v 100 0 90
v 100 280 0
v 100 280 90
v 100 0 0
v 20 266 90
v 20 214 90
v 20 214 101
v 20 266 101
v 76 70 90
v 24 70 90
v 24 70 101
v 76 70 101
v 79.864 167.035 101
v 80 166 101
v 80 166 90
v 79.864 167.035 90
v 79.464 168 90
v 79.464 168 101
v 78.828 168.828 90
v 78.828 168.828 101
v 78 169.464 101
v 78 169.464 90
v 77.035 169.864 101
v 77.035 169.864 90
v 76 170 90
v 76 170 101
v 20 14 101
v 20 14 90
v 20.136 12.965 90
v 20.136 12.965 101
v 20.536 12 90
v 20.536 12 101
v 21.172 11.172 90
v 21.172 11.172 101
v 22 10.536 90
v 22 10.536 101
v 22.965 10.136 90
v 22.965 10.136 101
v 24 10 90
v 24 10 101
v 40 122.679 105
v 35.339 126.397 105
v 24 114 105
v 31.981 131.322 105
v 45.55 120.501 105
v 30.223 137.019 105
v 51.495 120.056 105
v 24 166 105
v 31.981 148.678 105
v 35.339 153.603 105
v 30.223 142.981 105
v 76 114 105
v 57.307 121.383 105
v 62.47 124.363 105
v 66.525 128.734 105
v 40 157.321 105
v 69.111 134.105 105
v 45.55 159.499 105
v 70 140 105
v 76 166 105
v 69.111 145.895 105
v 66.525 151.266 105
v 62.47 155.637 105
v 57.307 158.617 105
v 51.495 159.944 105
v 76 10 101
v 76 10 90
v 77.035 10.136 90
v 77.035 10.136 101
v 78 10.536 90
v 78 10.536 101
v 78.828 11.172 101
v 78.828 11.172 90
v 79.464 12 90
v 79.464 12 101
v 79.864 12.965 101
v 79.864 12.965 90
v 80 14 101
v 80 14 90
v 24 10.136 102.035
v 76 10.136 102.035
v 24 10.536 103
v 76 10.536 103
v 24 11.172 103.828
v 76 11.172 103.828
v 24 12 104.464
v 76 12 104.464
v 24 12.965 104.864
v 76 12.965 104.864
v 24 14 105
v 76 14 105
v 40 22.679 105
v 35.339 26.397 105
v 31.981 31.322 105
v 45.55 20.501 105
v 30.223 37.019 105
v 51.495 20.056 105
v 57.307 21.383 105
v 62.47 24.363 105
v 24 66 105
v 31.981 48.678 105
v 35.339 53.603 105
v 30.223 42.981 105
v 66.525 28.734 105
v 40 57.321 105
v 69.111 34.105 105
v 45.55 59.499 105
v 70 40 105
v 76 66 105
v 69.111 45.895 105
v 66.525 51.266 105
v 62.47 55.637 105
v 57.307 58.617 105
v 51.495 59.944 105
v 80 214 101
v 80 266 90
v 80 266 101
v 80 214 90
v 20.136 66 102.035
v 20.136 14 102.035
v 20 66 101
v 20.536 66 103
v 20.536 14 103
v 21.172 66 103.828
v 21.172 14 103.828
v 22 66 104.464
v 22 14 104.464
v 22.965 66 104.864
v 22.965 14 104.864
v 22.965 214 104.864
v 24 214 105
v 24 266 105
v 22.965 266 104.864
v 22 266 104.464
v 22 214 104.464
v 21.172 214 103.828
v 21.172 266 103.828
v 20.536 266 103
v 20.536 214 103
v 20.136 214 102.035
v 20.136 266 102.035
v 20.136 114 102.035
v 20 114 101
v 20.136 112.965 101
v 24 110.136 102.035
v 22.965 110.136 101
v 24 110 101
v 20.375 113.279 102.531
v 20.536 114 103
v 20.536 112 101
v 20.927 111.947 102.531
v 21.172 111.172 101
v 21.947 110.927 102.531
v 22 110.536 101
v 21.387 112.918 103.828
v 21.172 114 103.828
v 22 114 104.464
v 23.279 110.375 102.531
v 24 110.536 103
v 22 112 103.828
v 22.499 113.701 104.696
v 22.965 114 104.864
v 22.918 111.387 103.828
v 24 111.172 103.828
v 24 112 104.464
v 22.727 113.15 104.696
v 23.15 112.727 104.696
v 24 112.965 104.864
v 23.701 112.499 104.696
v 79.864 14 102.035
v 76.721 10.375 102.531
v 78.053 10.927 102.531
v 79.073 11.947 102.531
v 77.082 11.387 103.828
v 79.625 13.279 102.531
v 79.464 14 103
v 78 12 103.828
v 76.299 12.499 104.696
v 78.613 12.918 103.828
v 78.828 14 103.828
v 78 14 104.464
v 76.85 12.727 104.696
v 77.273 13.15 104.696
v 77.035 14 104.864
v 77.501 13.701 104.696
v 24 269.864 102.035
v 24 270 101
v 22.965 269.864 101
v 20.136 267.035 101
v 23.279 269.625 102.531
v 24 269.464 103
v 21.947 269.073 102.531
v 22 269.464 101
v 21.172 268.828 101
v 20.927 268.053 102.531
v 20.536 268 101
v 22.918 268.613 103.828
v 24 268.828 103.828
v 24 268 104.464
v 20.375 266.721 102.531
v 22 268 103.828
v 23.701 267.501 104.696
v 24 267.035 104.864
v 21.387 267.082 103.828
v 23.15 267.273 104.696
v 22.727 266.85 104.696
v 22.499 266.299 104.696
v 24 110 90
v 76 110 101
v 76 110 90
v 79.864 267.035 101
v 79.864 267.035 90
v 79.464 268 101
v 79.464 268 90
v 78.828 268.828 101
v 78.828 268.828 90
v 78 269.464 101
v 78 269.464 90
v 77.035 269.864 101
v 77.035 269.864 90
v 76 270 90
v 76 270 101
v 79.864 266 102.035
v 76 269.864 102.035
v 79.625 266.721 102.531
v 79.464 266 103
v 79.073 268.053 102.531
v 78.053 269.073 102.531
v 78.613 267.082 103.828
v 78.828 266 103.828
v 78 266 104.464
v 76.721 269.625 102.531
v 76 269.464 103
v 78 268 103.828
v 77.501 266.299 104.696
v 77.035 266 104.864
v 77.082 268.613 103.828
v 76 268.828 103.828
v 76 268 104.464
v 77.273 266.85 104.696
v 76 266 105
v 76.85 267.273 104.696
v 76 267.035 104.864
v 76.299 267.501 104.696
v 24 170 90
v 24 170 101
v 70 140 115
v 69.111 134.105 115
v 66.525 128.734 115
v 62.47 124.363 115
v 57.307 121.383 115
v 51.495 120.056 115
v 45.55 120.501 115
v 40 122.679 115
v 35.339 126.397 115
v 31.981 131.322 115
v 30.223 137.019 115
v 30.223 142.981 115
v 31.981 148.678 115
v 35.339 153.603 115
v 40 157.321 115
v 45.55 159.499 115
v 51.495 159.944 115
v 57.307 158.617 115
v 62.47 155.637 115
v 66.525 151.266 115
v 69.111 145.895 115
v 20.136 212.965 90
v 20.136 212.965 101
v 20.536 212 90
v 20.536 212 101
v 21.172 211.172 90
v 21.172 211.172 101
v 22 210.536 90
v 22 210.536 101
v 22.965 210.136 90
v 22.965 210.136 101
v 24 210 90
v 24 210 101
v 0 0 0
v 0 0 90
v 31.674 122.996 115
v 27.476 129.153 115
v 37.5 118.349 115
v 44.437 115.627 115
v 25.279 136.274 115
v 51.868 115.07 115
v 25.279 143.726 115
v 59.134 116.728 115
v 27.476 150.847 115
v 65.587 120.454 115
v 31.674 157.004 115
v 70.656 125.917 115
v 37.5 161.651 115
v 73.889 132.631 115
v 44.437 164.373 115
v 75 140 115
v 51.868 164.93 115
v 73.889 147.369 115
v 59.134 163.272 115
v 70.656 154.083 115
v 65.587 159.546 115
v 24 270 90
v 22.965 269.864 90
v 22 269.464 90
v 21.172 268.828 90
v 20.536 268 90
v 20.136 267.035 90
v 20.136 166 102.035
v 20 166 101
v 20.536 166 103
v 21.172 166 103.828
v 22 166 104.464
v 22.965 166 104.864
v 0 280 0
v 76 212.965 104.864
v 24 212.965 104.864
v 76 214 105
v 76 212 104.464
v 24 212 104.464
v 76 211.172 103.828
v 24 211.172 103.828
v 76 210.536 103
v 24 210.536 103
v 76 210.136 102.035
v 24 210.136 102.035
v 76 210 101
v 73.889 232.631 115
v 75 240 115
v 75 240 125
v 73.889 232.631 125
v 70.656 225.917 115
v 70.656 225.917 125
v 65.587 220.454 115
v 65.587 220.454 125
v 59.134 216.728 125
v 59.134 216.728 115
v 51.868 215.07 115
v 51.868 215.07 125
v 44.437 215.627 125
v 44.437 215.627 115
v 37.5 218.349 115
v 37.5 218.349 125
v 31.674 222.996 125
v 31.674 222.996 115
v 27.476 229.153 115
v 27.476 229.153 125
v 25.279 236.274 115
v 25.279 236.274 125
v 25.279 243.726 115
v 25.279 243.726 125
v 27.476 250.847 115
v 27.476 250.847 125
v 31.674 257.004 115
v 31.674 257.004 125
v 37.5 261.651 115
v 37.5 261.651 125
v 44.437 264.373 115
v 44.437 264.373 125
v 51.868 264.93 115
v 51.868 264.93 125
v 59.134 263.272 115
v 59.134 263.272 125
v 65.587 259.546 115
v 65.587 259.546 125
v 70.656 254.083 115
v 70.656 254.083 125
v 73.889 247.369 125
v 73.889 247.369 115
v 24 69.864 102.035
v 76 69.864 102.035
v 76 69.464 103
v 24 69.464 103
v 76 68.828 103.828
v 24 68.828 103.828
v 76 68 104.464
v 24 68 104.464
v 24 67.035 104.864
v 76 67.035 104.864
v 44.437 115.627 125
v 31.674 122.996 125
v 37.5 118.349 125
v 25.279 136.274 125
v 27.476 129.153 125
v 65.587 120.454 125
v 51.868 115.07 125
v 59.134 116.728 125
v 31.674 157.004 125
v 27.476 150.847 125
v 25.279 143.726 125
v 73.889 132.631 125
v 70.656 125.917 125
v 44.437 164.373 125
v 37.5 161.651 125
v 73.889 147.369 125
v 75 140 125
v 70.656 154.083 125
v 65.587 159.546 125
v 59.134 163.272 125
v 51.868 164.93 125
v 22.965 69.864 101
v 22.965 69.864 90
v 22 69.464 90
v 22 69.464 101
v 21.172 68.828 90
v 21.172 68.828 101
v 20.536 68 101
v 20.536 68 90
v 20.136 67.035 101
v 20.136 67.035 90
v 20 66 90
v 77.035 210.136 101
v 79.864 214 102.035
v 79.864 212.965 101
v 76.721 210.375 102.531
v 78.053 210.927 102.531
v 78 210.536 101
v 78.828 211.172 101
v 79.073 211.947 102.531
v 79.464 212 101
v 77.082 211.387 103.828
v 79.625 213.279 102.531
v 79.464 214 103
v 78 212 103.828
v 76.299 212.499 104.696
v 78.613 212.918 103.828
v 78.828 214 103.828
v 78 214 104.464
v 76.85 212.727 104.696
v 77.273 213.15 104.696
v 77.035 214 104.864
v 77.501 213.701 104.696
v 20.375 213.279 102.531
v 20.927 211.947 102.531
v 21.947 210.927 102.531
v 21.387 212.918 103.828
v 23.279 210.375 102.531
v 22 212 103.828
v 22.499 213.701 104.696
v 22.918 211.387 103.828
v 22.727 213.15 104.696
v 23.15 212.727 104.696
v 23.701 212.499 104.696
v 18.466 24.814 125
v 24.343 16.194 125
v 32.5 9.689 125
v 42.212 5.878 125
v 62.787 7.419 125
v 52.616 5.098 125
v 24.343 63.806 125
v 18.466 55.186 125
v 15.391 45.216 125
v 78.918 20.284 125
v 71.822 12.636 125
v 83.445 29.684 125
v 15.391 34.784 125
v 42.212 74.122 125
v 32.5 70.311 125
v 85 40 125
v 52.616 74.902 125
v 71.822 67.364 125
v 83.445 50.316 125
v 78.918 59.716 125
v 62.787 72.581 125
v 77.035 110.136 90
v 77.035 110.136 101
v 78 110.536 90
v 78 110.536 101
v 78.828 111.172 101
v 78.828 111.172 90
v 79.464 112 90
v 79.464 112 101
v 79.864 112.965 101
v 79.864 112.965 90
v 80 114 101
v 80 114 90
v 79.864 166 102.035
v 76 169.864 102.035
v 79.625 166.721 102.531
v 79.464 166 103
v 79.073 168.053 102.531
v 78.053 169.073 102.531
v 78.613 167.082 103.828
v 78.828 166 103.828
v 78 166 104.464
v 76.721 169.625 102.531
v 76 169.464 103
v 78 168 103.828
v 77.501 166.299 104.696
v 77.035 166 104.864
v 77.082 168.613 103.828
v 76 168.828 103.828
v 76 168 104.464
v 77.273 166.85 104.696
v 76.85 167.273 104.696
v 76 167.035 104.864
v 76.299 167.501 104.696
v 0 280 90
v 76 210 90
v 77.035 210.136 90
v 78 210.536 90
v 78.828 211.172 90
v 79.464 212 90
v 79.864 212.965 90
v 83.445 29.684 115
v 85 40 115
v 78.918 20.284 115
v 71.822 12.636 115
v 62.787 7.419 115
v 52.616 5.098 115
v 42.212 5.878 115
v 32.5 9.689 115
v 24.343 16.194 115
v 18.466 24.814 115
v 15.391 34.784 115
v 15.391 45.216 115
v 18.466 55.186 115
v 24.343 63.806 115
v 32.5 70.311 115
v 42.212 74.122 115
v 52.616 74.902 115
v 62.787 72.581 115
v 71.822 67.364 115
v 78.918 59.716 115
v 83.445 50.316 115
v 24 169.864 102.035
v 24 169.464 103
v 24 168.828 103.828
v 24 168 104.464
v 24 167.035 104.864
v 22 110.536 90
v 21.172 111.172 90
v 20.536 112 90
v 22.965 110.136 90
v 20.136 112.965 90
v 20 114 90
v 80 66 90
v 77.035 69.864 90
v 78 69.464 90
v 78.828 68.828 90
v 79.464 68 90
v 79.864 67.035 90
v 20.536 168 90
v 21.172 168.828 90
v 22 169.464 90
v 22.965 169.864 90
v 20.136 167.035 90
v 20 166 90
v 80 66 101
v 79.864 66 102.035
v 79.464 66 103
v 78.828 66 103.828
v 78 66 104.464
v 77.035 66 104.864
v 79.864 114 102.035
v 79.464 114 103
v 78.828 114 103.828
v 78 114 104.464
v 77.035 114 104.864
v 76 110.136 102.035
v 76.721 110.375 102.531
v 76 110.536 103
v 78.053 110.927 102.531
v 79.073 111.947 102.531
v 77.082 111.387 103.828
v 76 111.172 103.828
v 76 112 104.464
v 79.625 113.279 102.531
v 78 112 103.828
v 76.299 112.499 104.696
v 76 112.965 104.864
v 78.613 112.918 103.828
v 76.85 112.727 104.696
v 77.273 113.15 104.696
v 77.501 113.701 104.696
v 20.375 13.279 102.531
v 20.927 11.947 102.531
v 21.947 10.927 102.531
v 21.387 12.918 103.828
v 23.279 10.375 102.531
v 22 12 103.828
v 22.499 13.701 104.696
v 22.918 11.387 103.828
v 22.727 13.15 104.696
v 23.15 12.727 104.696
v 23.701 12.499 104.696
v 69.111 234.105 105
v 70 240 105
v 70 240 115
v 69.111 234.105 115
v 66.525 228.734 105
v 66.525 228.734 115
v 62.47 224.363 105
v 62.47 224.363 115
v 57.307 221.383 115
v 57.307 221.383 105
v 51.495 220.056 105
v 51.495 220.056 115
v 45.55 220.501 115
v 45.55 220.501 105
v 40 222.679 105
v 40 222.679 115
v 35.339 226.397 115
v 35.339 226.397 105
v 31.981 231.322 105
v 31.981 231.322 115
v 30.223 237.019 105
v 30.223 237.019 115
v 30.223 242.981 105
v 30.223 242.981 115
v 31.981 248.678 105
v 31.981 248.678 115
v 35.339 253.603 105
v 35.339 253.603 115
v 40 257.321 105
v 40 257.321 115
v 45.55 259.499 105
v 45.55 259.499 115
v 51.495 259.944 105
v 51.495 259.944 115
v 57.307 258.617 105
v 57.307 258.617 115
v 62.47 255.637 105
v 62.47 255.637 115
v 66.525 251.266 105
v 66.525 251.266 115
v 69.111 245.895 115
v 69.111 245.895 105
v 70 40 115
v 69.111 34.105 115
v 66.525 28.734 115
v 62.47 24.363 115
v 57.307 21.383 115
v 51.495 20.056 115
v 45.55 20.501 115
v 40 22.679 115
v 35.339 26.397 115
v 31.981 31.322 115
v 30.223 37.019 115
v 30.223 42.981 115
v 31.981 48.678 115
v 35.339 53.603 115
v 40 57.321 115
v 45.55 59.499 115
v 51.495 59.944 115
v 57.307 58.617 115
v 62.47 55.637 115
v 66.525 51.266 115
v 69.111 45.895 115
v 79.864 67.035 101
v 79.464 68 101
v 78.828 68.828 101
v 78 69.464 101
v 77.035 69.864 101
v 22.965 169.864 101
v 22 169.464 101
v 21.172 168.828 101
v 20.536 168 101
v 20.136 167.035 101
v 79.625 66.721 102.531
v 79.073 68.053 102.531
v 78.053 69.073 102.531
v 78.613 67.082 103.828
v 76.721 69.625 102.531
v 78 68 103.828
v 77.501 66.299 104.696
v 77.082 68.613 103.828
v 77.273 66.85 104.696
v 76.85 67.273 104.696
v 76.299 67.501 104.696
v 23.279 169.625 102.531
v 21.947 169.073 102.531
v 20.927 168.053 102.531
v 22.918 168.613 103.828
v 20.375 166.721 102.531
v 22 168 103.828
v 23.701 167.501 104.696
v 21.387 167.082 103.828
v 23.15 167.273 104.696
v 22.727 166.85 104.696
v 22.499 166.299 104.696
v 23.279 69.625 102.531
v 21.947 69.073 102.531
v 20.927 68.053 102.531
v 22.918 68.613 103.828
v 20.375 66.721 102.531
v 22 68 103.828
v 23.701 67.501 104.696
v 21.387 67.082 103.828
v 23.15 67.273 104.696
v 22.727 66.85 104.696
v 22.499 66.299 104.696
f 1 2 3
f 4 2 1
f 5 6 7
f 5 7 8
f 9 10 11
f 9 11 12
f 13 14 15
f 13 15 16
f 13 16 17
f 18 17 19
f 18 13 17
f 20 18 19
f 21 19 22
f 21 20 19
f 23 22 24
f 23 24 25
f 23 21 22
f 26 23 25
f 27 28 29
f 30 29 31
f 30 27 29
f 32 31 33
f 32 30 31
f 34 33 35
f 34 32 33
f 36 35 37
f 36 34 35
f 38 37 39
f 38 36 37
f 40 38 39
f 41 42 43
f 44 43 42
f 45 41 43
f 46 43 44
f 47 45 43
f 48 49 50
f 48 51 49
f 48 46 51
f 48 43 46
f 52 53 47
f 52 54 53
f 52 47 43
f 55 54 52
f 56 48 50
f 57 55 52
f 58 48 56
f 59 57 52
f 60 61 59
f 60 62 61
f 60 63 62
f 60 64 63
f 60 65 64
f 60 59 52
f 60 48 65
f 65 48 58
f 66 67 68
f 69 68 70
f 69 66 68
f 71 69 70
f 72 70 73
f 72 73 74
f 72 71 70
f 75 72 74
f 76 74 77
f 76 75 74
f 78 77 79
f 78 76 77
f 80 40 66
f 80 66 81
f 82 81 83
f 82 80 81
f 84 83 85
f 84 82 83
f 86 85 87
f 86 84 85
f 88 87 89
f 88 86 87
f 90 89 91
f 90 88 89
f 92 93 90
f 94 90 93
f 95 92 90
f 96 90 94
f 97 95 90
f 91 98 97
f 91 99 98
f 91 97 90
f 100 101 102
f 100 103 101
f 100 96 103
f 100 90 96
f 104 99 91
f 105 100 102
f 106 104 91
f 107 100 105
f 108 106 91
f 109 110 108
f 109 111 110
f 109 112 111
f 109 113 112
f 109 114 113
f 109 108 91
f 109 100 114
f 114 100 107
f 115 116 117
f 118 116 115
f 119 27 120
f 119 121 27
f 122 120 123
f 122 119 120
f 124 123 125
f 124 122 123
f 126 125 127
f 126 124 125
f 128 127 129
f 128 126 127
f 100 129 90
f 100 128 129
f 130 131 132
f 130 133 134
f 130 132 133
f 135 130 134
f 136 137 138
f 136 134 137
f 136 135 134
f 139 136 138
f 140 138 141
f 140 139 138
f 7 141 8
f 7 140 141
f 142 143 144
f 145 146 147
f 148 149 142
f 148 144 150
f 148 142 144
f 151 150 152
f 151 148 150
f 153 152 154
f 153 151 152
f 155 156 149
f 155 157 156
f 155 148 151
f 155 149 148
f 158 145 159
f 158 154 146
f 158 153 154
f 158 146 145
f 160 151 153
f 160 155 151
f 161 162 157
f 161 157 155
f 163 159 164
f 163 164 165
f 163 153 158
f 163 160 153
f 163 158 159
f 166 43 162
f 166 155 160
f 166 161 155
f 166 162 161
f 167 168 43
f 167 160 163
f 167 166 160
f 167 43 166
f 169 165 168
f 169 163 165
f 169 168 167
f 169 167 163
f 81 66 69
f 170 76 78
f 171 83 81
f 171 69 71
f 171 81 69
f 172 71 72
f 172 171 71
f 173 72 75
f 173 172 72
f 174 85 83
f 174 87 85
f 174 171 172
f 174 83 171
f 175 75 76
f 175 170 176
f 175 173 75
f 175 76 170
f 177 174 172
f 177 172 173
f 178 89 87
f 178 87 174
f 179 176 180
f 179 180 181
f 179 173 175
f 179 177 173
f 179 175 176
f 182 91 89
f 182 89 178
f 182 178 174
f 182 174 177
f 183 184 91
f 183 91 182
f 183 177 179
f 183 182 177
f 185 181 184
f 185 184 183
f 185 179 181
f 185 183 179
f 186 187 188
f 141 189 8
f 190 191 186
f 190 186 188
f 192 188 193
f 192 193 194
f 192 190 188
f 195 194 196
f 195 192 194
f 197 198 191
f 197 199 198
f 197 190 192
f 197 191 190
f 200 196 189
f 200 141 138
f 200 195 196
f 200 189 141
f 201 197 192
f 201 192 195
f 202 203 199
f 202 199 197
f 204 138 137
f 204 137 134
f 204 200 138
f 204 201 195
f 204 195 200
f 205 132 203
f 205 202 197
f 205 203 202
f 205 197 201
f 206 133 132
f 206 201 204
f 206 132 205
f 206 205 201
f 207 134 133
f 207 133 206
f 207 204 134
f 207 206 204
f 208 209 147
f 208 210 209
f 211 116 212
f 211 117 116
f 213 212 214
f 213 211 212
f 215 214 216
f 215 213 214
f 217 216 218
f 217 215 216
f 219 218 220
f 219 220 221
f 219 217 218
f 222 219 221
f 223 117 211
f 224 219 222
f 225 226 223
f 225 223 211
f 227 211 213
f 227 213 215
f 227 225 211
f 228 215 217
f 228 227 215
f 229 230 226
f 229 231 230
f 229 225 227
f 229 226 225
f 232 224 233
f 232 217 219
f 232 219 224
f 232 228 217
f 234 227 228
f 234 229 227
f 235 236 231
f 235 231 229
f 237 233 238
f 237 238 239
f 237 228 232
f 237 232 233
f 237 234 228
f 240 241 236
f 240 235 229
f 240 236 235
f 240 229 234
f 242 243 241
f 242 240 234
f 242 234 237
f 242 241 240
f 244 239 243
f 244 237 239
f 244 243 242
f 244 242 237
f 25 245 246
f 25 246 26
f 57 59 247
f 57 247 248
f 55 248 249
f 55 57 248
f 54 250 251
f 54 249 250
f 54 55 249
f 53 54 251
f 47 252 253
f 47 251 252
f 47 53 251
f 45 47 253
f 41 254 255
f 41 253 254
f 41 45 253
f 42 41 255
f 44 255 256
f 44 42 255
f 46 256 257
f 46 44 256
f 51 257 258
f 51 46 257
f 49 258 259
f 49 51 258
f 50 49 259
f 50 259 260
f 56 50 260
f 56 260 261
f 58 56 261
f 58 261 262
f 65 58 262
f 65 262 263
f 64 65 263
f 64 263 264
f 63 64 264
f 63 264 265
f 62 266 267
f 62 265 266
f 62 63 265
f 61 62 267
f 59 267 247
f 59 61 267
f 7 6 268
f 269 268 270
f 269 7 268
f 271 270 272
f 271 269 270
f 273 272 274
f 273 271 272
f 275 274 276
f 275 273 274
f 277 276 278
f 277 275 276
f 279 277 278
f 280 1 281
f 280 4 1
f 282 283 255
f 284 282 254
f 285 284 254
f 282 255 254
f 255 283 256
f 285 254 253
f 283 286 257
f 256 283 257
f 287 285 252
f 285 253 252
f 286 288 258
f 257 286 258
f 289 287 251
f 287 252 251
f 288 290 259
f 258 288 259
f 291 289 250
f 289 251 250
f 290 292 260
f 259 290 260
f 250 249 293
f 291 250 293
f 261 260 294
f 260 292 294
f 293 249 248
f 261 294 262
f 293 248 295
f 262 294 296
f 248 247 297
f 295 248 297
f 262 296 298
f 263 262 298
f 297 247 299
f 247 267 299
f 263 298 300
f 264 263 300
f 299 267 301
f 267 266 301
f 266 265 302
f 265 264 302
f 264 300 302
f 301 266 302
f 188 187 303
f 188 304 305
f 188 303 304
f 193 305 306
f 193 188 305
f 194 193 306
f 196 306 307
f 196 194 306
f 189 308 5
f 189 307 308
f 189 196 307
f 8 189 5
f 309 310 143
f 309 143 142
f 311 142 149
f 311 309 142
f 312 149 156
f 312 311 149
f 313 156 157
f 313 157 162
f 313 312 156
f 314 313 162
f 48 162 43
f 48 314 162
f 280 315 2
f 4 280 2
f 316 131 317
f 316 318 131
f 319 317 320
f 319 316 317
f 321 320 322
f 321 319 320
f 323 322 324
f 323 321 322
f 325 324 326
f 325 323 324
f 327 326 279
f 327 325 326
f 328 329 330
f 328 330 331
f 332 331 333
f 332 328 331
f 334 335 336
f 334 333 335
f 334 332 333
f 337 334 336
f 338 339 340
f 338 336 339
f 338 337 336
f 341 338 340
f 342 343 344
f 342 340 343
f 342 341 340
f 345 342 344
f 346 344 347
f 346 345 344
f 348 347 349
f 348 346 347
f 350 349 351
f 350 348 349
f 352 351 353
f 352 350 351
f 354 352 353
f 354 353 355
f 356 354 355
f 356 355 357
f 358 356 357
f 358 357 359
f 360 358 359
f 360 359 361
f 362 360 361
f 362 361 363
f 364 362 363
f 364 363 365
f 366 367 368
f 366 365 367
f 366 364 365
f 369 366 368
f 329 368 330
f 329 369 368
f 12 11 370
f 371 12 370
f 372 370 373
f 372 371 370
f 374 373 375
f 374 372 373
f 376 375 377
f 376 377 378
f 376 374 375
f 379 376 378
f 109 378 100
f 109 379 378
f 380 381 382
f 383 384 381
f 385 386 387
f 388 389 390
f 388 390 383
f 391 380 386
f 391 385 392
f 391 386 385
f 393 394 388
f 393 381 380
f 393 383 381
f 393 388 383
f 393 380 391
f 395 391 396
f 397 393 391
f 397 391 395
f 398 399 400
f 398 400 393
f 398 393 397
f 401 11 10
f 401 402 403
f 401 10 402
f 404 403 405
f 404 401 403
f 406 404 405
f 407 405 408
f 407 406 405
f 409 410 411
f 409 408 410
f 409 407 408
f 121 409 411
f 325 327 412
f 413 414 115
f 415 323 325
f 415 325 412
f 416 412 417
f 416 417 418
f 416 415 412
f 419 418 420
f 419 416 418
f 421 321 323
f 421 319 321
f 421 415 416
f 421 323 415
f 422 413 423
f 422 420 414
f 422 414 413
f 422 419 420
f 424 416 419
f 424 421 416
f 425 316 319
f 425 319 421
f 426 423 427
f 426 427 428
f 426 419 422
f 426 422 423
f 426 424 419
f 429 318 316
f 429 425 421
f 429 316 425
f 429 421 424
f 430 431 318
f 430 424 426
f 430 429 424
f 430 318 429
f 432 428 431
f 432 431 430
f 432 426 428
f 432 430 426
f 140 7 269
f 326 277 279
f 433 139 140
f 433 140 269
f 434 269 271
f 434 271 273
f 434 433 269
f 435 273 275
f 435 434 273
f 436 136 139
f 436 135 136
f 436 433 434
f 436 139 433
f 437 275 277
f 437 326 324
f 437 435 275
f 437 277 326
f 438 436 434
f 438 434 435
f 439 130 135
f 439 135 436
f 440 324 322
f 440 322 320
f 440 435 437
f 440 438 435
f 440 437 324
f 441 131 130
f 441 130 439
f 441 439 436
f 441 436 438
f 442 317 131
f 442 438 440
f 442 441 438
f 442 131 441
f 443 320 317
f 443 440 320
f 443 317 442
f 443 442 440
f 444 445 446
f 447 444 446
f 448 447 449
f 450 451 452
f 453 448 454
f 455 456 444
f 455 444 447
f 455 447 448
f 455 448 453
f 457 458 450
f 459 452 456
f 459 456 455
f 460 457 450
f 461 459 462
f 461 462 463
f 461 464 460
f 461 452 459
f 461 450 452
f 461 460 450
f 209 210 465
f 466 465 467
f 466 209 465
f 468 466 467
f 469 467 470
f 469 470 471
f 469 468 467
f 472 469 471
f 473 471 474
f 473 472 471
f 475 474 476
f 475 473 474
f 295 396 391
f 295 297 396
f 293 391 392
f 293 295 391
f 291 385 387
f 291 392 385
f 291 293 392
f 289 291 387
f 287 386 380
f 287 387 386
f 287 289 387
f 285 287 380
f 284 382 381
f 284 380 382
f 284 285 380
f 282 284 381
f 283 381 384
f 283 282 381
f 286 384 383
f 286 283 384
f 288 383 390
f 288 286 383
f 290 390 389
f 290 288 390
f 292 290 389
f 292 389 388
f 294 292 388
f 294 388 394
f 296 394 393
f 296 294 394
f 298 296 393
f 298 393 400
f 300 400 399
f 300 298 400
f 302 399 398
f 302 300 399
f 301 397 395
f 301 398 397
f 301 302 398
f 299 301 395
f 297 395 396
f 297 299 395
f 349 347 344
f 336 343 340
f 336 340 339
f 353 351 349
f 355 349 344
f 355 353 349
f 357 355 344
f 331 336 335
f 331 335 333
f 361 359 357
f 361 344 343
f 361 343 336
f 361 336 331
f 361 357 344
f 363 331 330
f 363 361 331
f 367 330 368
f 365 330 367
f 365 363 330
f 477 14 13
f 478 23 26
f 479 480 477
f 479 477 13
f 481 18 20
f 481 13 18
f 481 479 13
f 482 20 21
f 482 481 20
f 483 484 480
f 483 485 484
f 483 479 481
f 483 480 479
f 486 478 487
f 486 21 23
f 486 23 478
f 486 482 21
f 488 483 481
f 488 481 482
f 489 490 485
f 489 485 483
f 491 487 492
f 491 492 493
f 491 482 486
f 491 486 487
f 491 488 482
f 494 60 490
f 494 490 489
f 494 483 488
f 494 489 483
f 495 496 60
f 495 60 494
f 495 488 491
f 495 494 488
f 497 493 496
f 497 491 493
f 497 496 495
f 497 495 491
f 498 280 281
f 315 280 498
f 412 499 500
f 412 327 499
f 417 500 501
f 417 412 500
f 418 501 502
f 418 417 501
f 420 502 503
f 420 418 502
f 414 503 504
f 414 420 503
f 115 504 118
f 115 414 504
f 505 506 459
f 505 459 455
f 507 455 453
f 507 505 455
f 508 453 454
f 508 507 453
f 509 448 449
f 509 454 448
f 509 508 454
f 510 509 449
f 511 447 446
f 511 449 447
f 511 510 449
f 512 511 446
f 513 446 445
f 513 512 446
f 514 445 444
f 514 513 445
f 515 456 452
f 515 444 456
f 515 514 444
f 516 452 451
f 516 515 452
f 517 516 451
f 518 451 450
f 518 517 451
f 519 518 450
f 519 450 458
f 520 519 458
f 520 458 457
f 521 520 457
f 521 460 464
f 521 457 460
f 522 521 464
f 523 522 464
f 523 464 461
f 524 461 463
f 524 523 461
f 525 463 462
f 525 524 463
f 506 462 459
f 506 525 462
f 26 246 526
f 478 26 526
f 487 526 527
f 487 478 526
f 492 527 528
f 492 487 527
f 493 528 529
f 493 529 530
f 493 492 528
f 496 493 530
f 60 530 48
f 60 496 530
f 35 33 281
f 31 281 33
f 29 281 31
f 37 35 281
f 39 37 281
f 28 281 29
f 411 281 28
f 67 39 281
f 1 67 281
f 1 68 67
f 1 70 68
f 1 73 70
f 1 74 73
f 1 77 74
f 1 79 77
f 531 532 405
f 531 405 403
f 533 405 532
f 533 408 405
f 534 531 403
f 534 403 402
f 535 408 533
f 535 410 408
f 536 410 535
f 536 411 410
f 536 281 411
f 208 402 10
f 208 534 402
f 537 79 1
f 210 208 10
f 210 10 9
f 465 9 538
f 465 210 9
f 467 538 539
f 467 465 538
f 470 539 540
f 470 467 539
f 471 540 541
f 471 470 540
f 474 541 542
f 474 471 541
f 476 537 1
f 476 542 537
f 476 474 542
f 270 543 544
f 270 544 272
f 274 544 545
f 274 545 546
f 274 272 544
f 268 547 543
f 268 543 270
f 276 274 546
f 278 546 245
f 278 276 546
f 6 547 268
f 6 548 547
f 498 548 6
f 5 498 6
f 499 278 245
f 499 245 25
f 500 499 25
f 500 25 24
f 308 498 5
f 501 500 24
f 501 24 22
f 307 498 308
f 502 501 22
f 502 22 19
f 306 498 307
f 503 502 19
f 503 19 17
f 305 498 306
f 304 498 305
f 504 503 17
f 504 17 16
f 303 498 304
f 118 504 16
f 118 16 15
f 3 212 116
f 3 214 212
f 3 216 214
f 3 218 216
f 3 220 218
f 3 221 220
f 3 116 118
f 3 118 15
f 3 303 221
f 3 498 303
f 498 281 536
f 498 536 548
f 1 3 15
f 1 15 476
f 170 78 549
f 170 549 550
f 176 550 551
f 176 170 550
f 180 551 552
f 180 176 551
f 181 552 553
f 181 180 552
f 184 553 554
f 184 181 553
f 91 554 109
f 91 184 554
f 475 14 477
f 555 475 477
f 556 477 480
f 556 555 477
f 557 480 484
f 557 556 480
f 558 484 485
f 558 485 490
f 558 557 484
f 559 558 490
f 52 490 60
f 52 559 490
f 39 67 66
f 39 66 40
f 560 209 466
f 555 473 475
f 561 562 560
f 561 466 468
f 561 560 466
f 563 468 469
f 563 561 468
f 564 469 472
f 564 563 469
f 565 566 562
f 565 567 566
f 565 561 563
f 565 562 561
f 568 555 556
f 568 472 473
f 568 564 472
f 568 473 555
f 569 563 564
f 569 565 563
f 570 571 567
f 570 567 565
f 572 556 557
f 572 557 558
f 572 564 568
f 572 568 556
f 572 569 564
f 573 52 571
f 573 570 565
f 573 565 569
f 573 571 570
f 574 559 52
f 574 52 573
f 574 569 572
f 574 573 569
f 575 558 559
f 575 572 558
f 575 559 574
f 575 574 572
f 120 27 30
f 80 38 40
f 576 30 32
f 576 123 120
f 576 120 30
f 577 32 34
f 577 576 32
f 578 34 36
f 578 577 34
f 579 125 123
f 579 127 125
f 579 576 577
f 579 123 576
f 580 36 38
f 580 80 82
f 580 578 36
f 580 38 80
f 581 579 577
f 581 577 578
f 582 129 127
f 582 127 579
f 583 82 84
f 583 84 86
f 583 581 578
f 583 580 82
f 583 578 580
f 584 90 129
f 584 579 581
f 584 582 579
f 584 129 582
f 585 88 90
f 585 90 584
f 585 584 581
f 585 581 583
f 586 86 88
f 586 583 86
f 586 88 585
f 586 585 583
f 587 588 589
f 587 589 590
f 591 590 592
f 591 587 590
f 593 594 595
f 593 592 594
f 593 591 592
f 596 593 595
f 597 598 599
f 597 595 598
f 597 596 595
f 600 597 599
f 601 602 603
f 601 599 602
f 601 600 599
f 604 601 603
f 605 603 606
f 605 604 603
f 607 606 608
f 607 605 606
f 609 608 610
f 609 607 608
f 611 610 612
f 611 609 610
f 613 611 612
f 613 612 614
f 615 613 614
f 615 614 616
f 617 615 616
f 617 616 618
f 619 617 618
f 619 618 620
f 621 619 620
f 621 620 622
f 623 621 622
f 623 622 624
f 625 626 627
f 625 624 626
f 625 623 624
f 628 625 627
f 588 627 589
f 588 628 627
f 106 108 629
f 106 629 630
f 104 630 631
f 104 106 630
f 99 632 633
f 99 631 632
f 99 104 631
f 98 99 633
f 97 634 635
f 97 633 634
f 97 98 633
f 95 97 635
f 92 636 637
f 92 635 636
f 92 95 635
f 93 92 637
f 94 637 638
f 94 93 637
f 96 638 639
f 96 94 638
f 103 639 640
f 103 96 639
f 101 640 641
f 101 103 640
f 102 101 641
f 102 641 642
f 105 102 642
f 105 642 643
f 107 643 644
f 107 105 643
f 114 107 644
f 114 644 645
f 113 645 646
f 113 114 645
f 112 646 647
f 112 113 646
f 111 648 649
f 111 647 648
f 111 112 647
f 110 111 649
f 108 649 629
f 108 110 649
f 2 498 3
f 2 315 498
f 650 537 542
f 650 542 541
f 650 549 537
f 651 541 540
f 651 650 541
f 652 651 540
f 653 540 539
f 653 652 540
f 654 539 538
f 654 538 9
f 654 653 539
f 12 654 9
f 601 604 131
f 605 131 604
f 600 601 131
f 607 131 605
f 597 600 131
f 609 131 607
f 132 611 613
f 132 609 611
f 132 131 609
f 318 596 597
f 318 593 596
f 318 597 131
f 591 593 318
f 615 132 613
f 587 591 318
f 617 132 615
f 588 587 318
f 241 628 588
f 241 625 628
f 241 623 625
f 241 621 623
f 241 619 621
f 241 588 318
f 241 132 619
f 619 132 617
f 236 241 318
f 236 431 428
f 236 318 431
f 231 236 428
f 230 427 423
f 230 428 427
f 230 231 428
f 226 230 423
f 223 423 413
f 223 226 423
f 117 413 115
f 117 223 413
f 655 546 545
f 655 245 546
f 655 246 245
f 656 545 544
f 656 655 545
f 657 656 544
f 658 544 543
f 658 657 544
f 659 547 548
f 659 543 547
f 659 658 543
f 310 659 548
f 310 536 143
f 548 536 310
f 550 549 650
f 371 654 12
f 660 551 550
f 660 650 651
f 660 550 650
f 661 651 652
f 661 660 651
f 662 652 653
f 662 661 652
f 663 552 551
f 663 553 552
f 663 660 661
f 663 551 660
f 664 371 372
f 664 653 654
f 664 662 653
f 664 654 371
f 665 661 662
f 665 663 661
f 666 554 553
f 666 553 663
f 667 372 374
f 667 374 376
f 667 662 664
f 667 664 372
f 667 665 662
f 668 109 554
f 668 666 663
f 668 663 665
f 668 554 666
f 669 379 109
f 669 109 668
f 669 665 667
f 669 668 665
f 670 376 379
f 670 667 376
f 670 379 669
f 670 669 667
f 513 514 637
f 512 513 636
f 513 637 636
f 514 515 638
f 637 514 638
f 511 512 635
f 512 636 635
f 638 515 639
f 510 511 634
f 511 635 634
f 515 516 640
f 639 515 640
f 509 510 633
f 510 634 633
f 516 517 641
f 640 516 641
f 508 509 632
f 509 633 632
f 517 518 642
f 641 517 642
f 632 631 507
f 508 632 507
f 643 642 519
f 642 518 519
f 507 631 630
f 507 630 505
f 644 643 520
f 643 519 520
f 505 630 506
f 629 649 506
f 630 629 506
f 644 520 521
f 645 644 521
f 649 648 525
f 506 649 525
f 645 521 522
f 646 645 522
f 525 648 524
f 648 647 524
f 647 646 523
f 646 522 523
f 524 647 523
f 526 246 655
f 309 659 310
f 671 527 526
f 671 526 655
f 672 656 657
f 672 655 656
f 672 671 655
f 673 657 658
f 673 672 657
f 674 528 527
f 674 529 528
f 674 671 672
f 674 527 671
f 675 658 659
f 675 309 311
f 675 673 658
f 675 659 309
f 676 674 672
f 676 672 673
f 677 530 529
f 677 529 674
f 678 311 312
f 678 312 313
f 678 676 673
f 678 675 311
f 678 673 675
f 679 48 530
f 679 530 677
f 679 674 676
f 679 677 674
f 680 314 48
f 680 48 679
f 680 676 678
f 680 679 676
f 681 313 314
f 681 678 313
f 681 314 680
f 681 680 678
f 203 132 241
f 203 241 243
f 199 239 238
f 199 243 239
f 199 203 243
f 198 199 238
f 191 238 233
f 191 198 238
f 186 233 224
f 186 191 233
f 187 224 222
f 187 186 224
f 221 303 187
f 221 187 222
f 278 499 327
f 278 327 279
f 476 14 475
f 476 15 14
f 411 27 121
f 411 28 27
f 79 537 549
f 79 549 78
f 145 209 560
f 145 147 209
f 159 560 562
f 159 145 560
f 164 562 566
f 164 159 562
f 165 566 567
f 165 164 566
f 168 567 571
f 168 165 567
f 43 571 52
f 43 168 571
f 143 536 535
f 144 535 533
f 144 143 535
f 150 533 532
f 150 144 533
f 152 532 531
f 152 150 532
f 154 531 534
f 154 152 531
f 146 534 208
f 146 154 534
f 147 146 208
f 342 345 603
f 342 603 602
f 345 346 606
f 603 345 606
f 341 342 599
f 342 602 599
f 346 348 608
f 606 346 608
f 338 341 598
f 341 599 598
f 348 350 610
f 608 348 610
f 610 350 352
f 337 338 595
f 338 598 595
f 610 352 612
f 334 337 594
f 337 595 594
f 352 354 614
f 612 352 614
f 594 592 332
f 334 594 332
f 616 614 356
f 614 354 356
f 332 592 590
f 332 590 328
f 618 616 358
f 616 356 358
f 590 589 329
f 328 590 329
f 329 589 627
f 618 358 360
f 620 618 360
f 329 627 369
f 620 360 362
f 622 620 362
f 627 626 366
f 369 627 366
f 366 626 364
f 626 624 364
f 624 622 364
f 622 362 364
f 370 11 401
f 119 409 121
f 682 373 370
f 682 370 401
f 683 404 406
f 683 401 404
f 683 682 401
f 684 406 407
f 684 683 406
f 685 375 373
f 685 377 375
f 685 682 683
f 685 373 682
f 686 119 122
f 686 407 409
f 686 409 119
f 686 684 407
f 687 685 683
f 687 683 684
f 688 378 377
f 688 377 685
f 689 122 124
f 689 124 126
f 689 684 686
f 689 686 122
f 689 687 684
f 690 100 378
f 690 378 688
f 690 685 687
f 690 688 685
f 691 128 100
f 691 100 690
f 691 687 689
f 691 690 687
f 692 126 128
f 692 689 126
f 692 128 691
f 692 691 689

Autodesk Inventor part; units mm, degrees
ref_plane "YZ Plane" through (0, 0, 0) normal (1, 0, 0) x (0, 1, 0)
ref_plane "XZ Plane" through (0, 0, 0) normal (0, 1, 0) x (-1, 0, 0)
ref_plane "XY Plane" through (0, 0, 0) normal (0, 0, 1) x (1, 0, 0)
sketch "Sketch1" plane through (0, 0, 0) normal (0, 0, 1) x (1, 0, 0)
  line L0 (0, 280) -> (100, 280)
  line L1 (100, 280) -> (100, 0)
  line L2 (100, 0) -> (0, 0)
  line L3 (0, 0) -> (0, 280)
  dimension "d0" = 280
  dimension "d1" = 100
extrude "Extrusion1" add sketch "Sketch1" along normal blind 90
sketch "Sketch2" plane through (0, 0, 90) normal (0, 0, 1) x (1, 0, 0)
  line L0 (20, 270) -> (80, 270)
  line L1 (80, 270) -> (80, 210)
  line L2 (80, 210) -> (20, 210)
  line L3 (20, 210) -> (20, 270)
  line L4 (20, 170) -> (80, 170)
  line L5 (80, 170) -> (80, 110)
  line L6 (80, 110) -> (20, 110)
  line L7 (20, 110) -> (20, 170)
  line L8 (20, 70) -> (80, 70)
  line L9 (80, 70) -> (80, 10)
  line L10 (80, 10) -> (20, 10)
  line L11 (20, 10) -> (20, 70)
  point P0 (0, 0)
  dimension "d4" = 20
  dimension "d5" = 80
  dimension "d6" = 270
  dimension "d7" = 210
  dimension "d8" = 10
  dimension "d9" = 70
  dimension "d10" = 110
  dimension "d11" = 170
extrude "Extrusion2" add sketch "Sketch2" along normal blind 15
fillet "Fillet1" radius 4 12 edges at (80, 270, 97.5) (80, 170, 97.5) (80, 70, 97.5) (80, 210, 97.5) (80, 110, 97.5) (80, 10, 97.5) (20, 270, 97.5) (20, 210, 97.5) (20, 170, 97.5) (20, 110, 97.5) (20, 70, 97.5) (20, 10, 97.5)
fillet "Fillet2" radius 4 24 edges at (78.8284, 268.8284, 105) (50, 270, 105) (21.1716, 268.8284, 105) (20, 240, 105) (21.1716, 211.1716, 105) (50, 210, 105) (78.8284, 211.1716, 105) (80, 240, 105) (21.1716, 168.8284, 105) (20, 140, 105) (21.1716, 111.1716, 105) (50, 110, 105) (78.8284, 111.1716, 105) (80, 140, 105) (78.8284, 168.8284, 105) (50, 170, 105) (21.1716, 68.8284, 105) (20, 40, 105) (21.1716, 11.1716, 105) (50, 10, 105) (78.8284, 11.1716, 105) (80, 40, 105) (78.8284, 68.8284, 105) (50, 70, 105)
sketch "Sketch3" plane through (0, 0, 105) normal (0, 0, 1) x (1, 0, 0)
  circle A0 centre (50, 240) radius 20
  line L0 (0, 336) -> (0, -56) projected
  circle A1 centre (50, 140) radius 20
  circle A2 centre (50, 40) radius 20
  point P0 (0, 0)
  dimension "d16" = 240
  dimension "d17" = 40
  dimension "d18" = 50
  dimension "d21" = 100
extrude "Extrusion3" add sketch "Sketch3" along normal blind 10
sketch "Sketch4" plane through (50, 240, 115) normal (0, 0, 1) x (1, 0, 0)
  circle A0 centre (0, 0) radius 20 projected
  circle A1 centre (0, 0) radius 25
  line L0 (-50, 96) -> (-50, -296) projected
  circle A2 centre (0, -100) radius 25
  circle A3 centre (0, -200) radius 35
  point P0 (-50, -240)
  dimension "d28" = 50
  dimension "d31" = 100
  dimension "d36" = 200
  dimension "d37" = 70
extrude "Extrusion4" add sketch "Sketch4" along normal blind 10 contours A0 | A1 | A2 | A3
properties part number "Botones"
